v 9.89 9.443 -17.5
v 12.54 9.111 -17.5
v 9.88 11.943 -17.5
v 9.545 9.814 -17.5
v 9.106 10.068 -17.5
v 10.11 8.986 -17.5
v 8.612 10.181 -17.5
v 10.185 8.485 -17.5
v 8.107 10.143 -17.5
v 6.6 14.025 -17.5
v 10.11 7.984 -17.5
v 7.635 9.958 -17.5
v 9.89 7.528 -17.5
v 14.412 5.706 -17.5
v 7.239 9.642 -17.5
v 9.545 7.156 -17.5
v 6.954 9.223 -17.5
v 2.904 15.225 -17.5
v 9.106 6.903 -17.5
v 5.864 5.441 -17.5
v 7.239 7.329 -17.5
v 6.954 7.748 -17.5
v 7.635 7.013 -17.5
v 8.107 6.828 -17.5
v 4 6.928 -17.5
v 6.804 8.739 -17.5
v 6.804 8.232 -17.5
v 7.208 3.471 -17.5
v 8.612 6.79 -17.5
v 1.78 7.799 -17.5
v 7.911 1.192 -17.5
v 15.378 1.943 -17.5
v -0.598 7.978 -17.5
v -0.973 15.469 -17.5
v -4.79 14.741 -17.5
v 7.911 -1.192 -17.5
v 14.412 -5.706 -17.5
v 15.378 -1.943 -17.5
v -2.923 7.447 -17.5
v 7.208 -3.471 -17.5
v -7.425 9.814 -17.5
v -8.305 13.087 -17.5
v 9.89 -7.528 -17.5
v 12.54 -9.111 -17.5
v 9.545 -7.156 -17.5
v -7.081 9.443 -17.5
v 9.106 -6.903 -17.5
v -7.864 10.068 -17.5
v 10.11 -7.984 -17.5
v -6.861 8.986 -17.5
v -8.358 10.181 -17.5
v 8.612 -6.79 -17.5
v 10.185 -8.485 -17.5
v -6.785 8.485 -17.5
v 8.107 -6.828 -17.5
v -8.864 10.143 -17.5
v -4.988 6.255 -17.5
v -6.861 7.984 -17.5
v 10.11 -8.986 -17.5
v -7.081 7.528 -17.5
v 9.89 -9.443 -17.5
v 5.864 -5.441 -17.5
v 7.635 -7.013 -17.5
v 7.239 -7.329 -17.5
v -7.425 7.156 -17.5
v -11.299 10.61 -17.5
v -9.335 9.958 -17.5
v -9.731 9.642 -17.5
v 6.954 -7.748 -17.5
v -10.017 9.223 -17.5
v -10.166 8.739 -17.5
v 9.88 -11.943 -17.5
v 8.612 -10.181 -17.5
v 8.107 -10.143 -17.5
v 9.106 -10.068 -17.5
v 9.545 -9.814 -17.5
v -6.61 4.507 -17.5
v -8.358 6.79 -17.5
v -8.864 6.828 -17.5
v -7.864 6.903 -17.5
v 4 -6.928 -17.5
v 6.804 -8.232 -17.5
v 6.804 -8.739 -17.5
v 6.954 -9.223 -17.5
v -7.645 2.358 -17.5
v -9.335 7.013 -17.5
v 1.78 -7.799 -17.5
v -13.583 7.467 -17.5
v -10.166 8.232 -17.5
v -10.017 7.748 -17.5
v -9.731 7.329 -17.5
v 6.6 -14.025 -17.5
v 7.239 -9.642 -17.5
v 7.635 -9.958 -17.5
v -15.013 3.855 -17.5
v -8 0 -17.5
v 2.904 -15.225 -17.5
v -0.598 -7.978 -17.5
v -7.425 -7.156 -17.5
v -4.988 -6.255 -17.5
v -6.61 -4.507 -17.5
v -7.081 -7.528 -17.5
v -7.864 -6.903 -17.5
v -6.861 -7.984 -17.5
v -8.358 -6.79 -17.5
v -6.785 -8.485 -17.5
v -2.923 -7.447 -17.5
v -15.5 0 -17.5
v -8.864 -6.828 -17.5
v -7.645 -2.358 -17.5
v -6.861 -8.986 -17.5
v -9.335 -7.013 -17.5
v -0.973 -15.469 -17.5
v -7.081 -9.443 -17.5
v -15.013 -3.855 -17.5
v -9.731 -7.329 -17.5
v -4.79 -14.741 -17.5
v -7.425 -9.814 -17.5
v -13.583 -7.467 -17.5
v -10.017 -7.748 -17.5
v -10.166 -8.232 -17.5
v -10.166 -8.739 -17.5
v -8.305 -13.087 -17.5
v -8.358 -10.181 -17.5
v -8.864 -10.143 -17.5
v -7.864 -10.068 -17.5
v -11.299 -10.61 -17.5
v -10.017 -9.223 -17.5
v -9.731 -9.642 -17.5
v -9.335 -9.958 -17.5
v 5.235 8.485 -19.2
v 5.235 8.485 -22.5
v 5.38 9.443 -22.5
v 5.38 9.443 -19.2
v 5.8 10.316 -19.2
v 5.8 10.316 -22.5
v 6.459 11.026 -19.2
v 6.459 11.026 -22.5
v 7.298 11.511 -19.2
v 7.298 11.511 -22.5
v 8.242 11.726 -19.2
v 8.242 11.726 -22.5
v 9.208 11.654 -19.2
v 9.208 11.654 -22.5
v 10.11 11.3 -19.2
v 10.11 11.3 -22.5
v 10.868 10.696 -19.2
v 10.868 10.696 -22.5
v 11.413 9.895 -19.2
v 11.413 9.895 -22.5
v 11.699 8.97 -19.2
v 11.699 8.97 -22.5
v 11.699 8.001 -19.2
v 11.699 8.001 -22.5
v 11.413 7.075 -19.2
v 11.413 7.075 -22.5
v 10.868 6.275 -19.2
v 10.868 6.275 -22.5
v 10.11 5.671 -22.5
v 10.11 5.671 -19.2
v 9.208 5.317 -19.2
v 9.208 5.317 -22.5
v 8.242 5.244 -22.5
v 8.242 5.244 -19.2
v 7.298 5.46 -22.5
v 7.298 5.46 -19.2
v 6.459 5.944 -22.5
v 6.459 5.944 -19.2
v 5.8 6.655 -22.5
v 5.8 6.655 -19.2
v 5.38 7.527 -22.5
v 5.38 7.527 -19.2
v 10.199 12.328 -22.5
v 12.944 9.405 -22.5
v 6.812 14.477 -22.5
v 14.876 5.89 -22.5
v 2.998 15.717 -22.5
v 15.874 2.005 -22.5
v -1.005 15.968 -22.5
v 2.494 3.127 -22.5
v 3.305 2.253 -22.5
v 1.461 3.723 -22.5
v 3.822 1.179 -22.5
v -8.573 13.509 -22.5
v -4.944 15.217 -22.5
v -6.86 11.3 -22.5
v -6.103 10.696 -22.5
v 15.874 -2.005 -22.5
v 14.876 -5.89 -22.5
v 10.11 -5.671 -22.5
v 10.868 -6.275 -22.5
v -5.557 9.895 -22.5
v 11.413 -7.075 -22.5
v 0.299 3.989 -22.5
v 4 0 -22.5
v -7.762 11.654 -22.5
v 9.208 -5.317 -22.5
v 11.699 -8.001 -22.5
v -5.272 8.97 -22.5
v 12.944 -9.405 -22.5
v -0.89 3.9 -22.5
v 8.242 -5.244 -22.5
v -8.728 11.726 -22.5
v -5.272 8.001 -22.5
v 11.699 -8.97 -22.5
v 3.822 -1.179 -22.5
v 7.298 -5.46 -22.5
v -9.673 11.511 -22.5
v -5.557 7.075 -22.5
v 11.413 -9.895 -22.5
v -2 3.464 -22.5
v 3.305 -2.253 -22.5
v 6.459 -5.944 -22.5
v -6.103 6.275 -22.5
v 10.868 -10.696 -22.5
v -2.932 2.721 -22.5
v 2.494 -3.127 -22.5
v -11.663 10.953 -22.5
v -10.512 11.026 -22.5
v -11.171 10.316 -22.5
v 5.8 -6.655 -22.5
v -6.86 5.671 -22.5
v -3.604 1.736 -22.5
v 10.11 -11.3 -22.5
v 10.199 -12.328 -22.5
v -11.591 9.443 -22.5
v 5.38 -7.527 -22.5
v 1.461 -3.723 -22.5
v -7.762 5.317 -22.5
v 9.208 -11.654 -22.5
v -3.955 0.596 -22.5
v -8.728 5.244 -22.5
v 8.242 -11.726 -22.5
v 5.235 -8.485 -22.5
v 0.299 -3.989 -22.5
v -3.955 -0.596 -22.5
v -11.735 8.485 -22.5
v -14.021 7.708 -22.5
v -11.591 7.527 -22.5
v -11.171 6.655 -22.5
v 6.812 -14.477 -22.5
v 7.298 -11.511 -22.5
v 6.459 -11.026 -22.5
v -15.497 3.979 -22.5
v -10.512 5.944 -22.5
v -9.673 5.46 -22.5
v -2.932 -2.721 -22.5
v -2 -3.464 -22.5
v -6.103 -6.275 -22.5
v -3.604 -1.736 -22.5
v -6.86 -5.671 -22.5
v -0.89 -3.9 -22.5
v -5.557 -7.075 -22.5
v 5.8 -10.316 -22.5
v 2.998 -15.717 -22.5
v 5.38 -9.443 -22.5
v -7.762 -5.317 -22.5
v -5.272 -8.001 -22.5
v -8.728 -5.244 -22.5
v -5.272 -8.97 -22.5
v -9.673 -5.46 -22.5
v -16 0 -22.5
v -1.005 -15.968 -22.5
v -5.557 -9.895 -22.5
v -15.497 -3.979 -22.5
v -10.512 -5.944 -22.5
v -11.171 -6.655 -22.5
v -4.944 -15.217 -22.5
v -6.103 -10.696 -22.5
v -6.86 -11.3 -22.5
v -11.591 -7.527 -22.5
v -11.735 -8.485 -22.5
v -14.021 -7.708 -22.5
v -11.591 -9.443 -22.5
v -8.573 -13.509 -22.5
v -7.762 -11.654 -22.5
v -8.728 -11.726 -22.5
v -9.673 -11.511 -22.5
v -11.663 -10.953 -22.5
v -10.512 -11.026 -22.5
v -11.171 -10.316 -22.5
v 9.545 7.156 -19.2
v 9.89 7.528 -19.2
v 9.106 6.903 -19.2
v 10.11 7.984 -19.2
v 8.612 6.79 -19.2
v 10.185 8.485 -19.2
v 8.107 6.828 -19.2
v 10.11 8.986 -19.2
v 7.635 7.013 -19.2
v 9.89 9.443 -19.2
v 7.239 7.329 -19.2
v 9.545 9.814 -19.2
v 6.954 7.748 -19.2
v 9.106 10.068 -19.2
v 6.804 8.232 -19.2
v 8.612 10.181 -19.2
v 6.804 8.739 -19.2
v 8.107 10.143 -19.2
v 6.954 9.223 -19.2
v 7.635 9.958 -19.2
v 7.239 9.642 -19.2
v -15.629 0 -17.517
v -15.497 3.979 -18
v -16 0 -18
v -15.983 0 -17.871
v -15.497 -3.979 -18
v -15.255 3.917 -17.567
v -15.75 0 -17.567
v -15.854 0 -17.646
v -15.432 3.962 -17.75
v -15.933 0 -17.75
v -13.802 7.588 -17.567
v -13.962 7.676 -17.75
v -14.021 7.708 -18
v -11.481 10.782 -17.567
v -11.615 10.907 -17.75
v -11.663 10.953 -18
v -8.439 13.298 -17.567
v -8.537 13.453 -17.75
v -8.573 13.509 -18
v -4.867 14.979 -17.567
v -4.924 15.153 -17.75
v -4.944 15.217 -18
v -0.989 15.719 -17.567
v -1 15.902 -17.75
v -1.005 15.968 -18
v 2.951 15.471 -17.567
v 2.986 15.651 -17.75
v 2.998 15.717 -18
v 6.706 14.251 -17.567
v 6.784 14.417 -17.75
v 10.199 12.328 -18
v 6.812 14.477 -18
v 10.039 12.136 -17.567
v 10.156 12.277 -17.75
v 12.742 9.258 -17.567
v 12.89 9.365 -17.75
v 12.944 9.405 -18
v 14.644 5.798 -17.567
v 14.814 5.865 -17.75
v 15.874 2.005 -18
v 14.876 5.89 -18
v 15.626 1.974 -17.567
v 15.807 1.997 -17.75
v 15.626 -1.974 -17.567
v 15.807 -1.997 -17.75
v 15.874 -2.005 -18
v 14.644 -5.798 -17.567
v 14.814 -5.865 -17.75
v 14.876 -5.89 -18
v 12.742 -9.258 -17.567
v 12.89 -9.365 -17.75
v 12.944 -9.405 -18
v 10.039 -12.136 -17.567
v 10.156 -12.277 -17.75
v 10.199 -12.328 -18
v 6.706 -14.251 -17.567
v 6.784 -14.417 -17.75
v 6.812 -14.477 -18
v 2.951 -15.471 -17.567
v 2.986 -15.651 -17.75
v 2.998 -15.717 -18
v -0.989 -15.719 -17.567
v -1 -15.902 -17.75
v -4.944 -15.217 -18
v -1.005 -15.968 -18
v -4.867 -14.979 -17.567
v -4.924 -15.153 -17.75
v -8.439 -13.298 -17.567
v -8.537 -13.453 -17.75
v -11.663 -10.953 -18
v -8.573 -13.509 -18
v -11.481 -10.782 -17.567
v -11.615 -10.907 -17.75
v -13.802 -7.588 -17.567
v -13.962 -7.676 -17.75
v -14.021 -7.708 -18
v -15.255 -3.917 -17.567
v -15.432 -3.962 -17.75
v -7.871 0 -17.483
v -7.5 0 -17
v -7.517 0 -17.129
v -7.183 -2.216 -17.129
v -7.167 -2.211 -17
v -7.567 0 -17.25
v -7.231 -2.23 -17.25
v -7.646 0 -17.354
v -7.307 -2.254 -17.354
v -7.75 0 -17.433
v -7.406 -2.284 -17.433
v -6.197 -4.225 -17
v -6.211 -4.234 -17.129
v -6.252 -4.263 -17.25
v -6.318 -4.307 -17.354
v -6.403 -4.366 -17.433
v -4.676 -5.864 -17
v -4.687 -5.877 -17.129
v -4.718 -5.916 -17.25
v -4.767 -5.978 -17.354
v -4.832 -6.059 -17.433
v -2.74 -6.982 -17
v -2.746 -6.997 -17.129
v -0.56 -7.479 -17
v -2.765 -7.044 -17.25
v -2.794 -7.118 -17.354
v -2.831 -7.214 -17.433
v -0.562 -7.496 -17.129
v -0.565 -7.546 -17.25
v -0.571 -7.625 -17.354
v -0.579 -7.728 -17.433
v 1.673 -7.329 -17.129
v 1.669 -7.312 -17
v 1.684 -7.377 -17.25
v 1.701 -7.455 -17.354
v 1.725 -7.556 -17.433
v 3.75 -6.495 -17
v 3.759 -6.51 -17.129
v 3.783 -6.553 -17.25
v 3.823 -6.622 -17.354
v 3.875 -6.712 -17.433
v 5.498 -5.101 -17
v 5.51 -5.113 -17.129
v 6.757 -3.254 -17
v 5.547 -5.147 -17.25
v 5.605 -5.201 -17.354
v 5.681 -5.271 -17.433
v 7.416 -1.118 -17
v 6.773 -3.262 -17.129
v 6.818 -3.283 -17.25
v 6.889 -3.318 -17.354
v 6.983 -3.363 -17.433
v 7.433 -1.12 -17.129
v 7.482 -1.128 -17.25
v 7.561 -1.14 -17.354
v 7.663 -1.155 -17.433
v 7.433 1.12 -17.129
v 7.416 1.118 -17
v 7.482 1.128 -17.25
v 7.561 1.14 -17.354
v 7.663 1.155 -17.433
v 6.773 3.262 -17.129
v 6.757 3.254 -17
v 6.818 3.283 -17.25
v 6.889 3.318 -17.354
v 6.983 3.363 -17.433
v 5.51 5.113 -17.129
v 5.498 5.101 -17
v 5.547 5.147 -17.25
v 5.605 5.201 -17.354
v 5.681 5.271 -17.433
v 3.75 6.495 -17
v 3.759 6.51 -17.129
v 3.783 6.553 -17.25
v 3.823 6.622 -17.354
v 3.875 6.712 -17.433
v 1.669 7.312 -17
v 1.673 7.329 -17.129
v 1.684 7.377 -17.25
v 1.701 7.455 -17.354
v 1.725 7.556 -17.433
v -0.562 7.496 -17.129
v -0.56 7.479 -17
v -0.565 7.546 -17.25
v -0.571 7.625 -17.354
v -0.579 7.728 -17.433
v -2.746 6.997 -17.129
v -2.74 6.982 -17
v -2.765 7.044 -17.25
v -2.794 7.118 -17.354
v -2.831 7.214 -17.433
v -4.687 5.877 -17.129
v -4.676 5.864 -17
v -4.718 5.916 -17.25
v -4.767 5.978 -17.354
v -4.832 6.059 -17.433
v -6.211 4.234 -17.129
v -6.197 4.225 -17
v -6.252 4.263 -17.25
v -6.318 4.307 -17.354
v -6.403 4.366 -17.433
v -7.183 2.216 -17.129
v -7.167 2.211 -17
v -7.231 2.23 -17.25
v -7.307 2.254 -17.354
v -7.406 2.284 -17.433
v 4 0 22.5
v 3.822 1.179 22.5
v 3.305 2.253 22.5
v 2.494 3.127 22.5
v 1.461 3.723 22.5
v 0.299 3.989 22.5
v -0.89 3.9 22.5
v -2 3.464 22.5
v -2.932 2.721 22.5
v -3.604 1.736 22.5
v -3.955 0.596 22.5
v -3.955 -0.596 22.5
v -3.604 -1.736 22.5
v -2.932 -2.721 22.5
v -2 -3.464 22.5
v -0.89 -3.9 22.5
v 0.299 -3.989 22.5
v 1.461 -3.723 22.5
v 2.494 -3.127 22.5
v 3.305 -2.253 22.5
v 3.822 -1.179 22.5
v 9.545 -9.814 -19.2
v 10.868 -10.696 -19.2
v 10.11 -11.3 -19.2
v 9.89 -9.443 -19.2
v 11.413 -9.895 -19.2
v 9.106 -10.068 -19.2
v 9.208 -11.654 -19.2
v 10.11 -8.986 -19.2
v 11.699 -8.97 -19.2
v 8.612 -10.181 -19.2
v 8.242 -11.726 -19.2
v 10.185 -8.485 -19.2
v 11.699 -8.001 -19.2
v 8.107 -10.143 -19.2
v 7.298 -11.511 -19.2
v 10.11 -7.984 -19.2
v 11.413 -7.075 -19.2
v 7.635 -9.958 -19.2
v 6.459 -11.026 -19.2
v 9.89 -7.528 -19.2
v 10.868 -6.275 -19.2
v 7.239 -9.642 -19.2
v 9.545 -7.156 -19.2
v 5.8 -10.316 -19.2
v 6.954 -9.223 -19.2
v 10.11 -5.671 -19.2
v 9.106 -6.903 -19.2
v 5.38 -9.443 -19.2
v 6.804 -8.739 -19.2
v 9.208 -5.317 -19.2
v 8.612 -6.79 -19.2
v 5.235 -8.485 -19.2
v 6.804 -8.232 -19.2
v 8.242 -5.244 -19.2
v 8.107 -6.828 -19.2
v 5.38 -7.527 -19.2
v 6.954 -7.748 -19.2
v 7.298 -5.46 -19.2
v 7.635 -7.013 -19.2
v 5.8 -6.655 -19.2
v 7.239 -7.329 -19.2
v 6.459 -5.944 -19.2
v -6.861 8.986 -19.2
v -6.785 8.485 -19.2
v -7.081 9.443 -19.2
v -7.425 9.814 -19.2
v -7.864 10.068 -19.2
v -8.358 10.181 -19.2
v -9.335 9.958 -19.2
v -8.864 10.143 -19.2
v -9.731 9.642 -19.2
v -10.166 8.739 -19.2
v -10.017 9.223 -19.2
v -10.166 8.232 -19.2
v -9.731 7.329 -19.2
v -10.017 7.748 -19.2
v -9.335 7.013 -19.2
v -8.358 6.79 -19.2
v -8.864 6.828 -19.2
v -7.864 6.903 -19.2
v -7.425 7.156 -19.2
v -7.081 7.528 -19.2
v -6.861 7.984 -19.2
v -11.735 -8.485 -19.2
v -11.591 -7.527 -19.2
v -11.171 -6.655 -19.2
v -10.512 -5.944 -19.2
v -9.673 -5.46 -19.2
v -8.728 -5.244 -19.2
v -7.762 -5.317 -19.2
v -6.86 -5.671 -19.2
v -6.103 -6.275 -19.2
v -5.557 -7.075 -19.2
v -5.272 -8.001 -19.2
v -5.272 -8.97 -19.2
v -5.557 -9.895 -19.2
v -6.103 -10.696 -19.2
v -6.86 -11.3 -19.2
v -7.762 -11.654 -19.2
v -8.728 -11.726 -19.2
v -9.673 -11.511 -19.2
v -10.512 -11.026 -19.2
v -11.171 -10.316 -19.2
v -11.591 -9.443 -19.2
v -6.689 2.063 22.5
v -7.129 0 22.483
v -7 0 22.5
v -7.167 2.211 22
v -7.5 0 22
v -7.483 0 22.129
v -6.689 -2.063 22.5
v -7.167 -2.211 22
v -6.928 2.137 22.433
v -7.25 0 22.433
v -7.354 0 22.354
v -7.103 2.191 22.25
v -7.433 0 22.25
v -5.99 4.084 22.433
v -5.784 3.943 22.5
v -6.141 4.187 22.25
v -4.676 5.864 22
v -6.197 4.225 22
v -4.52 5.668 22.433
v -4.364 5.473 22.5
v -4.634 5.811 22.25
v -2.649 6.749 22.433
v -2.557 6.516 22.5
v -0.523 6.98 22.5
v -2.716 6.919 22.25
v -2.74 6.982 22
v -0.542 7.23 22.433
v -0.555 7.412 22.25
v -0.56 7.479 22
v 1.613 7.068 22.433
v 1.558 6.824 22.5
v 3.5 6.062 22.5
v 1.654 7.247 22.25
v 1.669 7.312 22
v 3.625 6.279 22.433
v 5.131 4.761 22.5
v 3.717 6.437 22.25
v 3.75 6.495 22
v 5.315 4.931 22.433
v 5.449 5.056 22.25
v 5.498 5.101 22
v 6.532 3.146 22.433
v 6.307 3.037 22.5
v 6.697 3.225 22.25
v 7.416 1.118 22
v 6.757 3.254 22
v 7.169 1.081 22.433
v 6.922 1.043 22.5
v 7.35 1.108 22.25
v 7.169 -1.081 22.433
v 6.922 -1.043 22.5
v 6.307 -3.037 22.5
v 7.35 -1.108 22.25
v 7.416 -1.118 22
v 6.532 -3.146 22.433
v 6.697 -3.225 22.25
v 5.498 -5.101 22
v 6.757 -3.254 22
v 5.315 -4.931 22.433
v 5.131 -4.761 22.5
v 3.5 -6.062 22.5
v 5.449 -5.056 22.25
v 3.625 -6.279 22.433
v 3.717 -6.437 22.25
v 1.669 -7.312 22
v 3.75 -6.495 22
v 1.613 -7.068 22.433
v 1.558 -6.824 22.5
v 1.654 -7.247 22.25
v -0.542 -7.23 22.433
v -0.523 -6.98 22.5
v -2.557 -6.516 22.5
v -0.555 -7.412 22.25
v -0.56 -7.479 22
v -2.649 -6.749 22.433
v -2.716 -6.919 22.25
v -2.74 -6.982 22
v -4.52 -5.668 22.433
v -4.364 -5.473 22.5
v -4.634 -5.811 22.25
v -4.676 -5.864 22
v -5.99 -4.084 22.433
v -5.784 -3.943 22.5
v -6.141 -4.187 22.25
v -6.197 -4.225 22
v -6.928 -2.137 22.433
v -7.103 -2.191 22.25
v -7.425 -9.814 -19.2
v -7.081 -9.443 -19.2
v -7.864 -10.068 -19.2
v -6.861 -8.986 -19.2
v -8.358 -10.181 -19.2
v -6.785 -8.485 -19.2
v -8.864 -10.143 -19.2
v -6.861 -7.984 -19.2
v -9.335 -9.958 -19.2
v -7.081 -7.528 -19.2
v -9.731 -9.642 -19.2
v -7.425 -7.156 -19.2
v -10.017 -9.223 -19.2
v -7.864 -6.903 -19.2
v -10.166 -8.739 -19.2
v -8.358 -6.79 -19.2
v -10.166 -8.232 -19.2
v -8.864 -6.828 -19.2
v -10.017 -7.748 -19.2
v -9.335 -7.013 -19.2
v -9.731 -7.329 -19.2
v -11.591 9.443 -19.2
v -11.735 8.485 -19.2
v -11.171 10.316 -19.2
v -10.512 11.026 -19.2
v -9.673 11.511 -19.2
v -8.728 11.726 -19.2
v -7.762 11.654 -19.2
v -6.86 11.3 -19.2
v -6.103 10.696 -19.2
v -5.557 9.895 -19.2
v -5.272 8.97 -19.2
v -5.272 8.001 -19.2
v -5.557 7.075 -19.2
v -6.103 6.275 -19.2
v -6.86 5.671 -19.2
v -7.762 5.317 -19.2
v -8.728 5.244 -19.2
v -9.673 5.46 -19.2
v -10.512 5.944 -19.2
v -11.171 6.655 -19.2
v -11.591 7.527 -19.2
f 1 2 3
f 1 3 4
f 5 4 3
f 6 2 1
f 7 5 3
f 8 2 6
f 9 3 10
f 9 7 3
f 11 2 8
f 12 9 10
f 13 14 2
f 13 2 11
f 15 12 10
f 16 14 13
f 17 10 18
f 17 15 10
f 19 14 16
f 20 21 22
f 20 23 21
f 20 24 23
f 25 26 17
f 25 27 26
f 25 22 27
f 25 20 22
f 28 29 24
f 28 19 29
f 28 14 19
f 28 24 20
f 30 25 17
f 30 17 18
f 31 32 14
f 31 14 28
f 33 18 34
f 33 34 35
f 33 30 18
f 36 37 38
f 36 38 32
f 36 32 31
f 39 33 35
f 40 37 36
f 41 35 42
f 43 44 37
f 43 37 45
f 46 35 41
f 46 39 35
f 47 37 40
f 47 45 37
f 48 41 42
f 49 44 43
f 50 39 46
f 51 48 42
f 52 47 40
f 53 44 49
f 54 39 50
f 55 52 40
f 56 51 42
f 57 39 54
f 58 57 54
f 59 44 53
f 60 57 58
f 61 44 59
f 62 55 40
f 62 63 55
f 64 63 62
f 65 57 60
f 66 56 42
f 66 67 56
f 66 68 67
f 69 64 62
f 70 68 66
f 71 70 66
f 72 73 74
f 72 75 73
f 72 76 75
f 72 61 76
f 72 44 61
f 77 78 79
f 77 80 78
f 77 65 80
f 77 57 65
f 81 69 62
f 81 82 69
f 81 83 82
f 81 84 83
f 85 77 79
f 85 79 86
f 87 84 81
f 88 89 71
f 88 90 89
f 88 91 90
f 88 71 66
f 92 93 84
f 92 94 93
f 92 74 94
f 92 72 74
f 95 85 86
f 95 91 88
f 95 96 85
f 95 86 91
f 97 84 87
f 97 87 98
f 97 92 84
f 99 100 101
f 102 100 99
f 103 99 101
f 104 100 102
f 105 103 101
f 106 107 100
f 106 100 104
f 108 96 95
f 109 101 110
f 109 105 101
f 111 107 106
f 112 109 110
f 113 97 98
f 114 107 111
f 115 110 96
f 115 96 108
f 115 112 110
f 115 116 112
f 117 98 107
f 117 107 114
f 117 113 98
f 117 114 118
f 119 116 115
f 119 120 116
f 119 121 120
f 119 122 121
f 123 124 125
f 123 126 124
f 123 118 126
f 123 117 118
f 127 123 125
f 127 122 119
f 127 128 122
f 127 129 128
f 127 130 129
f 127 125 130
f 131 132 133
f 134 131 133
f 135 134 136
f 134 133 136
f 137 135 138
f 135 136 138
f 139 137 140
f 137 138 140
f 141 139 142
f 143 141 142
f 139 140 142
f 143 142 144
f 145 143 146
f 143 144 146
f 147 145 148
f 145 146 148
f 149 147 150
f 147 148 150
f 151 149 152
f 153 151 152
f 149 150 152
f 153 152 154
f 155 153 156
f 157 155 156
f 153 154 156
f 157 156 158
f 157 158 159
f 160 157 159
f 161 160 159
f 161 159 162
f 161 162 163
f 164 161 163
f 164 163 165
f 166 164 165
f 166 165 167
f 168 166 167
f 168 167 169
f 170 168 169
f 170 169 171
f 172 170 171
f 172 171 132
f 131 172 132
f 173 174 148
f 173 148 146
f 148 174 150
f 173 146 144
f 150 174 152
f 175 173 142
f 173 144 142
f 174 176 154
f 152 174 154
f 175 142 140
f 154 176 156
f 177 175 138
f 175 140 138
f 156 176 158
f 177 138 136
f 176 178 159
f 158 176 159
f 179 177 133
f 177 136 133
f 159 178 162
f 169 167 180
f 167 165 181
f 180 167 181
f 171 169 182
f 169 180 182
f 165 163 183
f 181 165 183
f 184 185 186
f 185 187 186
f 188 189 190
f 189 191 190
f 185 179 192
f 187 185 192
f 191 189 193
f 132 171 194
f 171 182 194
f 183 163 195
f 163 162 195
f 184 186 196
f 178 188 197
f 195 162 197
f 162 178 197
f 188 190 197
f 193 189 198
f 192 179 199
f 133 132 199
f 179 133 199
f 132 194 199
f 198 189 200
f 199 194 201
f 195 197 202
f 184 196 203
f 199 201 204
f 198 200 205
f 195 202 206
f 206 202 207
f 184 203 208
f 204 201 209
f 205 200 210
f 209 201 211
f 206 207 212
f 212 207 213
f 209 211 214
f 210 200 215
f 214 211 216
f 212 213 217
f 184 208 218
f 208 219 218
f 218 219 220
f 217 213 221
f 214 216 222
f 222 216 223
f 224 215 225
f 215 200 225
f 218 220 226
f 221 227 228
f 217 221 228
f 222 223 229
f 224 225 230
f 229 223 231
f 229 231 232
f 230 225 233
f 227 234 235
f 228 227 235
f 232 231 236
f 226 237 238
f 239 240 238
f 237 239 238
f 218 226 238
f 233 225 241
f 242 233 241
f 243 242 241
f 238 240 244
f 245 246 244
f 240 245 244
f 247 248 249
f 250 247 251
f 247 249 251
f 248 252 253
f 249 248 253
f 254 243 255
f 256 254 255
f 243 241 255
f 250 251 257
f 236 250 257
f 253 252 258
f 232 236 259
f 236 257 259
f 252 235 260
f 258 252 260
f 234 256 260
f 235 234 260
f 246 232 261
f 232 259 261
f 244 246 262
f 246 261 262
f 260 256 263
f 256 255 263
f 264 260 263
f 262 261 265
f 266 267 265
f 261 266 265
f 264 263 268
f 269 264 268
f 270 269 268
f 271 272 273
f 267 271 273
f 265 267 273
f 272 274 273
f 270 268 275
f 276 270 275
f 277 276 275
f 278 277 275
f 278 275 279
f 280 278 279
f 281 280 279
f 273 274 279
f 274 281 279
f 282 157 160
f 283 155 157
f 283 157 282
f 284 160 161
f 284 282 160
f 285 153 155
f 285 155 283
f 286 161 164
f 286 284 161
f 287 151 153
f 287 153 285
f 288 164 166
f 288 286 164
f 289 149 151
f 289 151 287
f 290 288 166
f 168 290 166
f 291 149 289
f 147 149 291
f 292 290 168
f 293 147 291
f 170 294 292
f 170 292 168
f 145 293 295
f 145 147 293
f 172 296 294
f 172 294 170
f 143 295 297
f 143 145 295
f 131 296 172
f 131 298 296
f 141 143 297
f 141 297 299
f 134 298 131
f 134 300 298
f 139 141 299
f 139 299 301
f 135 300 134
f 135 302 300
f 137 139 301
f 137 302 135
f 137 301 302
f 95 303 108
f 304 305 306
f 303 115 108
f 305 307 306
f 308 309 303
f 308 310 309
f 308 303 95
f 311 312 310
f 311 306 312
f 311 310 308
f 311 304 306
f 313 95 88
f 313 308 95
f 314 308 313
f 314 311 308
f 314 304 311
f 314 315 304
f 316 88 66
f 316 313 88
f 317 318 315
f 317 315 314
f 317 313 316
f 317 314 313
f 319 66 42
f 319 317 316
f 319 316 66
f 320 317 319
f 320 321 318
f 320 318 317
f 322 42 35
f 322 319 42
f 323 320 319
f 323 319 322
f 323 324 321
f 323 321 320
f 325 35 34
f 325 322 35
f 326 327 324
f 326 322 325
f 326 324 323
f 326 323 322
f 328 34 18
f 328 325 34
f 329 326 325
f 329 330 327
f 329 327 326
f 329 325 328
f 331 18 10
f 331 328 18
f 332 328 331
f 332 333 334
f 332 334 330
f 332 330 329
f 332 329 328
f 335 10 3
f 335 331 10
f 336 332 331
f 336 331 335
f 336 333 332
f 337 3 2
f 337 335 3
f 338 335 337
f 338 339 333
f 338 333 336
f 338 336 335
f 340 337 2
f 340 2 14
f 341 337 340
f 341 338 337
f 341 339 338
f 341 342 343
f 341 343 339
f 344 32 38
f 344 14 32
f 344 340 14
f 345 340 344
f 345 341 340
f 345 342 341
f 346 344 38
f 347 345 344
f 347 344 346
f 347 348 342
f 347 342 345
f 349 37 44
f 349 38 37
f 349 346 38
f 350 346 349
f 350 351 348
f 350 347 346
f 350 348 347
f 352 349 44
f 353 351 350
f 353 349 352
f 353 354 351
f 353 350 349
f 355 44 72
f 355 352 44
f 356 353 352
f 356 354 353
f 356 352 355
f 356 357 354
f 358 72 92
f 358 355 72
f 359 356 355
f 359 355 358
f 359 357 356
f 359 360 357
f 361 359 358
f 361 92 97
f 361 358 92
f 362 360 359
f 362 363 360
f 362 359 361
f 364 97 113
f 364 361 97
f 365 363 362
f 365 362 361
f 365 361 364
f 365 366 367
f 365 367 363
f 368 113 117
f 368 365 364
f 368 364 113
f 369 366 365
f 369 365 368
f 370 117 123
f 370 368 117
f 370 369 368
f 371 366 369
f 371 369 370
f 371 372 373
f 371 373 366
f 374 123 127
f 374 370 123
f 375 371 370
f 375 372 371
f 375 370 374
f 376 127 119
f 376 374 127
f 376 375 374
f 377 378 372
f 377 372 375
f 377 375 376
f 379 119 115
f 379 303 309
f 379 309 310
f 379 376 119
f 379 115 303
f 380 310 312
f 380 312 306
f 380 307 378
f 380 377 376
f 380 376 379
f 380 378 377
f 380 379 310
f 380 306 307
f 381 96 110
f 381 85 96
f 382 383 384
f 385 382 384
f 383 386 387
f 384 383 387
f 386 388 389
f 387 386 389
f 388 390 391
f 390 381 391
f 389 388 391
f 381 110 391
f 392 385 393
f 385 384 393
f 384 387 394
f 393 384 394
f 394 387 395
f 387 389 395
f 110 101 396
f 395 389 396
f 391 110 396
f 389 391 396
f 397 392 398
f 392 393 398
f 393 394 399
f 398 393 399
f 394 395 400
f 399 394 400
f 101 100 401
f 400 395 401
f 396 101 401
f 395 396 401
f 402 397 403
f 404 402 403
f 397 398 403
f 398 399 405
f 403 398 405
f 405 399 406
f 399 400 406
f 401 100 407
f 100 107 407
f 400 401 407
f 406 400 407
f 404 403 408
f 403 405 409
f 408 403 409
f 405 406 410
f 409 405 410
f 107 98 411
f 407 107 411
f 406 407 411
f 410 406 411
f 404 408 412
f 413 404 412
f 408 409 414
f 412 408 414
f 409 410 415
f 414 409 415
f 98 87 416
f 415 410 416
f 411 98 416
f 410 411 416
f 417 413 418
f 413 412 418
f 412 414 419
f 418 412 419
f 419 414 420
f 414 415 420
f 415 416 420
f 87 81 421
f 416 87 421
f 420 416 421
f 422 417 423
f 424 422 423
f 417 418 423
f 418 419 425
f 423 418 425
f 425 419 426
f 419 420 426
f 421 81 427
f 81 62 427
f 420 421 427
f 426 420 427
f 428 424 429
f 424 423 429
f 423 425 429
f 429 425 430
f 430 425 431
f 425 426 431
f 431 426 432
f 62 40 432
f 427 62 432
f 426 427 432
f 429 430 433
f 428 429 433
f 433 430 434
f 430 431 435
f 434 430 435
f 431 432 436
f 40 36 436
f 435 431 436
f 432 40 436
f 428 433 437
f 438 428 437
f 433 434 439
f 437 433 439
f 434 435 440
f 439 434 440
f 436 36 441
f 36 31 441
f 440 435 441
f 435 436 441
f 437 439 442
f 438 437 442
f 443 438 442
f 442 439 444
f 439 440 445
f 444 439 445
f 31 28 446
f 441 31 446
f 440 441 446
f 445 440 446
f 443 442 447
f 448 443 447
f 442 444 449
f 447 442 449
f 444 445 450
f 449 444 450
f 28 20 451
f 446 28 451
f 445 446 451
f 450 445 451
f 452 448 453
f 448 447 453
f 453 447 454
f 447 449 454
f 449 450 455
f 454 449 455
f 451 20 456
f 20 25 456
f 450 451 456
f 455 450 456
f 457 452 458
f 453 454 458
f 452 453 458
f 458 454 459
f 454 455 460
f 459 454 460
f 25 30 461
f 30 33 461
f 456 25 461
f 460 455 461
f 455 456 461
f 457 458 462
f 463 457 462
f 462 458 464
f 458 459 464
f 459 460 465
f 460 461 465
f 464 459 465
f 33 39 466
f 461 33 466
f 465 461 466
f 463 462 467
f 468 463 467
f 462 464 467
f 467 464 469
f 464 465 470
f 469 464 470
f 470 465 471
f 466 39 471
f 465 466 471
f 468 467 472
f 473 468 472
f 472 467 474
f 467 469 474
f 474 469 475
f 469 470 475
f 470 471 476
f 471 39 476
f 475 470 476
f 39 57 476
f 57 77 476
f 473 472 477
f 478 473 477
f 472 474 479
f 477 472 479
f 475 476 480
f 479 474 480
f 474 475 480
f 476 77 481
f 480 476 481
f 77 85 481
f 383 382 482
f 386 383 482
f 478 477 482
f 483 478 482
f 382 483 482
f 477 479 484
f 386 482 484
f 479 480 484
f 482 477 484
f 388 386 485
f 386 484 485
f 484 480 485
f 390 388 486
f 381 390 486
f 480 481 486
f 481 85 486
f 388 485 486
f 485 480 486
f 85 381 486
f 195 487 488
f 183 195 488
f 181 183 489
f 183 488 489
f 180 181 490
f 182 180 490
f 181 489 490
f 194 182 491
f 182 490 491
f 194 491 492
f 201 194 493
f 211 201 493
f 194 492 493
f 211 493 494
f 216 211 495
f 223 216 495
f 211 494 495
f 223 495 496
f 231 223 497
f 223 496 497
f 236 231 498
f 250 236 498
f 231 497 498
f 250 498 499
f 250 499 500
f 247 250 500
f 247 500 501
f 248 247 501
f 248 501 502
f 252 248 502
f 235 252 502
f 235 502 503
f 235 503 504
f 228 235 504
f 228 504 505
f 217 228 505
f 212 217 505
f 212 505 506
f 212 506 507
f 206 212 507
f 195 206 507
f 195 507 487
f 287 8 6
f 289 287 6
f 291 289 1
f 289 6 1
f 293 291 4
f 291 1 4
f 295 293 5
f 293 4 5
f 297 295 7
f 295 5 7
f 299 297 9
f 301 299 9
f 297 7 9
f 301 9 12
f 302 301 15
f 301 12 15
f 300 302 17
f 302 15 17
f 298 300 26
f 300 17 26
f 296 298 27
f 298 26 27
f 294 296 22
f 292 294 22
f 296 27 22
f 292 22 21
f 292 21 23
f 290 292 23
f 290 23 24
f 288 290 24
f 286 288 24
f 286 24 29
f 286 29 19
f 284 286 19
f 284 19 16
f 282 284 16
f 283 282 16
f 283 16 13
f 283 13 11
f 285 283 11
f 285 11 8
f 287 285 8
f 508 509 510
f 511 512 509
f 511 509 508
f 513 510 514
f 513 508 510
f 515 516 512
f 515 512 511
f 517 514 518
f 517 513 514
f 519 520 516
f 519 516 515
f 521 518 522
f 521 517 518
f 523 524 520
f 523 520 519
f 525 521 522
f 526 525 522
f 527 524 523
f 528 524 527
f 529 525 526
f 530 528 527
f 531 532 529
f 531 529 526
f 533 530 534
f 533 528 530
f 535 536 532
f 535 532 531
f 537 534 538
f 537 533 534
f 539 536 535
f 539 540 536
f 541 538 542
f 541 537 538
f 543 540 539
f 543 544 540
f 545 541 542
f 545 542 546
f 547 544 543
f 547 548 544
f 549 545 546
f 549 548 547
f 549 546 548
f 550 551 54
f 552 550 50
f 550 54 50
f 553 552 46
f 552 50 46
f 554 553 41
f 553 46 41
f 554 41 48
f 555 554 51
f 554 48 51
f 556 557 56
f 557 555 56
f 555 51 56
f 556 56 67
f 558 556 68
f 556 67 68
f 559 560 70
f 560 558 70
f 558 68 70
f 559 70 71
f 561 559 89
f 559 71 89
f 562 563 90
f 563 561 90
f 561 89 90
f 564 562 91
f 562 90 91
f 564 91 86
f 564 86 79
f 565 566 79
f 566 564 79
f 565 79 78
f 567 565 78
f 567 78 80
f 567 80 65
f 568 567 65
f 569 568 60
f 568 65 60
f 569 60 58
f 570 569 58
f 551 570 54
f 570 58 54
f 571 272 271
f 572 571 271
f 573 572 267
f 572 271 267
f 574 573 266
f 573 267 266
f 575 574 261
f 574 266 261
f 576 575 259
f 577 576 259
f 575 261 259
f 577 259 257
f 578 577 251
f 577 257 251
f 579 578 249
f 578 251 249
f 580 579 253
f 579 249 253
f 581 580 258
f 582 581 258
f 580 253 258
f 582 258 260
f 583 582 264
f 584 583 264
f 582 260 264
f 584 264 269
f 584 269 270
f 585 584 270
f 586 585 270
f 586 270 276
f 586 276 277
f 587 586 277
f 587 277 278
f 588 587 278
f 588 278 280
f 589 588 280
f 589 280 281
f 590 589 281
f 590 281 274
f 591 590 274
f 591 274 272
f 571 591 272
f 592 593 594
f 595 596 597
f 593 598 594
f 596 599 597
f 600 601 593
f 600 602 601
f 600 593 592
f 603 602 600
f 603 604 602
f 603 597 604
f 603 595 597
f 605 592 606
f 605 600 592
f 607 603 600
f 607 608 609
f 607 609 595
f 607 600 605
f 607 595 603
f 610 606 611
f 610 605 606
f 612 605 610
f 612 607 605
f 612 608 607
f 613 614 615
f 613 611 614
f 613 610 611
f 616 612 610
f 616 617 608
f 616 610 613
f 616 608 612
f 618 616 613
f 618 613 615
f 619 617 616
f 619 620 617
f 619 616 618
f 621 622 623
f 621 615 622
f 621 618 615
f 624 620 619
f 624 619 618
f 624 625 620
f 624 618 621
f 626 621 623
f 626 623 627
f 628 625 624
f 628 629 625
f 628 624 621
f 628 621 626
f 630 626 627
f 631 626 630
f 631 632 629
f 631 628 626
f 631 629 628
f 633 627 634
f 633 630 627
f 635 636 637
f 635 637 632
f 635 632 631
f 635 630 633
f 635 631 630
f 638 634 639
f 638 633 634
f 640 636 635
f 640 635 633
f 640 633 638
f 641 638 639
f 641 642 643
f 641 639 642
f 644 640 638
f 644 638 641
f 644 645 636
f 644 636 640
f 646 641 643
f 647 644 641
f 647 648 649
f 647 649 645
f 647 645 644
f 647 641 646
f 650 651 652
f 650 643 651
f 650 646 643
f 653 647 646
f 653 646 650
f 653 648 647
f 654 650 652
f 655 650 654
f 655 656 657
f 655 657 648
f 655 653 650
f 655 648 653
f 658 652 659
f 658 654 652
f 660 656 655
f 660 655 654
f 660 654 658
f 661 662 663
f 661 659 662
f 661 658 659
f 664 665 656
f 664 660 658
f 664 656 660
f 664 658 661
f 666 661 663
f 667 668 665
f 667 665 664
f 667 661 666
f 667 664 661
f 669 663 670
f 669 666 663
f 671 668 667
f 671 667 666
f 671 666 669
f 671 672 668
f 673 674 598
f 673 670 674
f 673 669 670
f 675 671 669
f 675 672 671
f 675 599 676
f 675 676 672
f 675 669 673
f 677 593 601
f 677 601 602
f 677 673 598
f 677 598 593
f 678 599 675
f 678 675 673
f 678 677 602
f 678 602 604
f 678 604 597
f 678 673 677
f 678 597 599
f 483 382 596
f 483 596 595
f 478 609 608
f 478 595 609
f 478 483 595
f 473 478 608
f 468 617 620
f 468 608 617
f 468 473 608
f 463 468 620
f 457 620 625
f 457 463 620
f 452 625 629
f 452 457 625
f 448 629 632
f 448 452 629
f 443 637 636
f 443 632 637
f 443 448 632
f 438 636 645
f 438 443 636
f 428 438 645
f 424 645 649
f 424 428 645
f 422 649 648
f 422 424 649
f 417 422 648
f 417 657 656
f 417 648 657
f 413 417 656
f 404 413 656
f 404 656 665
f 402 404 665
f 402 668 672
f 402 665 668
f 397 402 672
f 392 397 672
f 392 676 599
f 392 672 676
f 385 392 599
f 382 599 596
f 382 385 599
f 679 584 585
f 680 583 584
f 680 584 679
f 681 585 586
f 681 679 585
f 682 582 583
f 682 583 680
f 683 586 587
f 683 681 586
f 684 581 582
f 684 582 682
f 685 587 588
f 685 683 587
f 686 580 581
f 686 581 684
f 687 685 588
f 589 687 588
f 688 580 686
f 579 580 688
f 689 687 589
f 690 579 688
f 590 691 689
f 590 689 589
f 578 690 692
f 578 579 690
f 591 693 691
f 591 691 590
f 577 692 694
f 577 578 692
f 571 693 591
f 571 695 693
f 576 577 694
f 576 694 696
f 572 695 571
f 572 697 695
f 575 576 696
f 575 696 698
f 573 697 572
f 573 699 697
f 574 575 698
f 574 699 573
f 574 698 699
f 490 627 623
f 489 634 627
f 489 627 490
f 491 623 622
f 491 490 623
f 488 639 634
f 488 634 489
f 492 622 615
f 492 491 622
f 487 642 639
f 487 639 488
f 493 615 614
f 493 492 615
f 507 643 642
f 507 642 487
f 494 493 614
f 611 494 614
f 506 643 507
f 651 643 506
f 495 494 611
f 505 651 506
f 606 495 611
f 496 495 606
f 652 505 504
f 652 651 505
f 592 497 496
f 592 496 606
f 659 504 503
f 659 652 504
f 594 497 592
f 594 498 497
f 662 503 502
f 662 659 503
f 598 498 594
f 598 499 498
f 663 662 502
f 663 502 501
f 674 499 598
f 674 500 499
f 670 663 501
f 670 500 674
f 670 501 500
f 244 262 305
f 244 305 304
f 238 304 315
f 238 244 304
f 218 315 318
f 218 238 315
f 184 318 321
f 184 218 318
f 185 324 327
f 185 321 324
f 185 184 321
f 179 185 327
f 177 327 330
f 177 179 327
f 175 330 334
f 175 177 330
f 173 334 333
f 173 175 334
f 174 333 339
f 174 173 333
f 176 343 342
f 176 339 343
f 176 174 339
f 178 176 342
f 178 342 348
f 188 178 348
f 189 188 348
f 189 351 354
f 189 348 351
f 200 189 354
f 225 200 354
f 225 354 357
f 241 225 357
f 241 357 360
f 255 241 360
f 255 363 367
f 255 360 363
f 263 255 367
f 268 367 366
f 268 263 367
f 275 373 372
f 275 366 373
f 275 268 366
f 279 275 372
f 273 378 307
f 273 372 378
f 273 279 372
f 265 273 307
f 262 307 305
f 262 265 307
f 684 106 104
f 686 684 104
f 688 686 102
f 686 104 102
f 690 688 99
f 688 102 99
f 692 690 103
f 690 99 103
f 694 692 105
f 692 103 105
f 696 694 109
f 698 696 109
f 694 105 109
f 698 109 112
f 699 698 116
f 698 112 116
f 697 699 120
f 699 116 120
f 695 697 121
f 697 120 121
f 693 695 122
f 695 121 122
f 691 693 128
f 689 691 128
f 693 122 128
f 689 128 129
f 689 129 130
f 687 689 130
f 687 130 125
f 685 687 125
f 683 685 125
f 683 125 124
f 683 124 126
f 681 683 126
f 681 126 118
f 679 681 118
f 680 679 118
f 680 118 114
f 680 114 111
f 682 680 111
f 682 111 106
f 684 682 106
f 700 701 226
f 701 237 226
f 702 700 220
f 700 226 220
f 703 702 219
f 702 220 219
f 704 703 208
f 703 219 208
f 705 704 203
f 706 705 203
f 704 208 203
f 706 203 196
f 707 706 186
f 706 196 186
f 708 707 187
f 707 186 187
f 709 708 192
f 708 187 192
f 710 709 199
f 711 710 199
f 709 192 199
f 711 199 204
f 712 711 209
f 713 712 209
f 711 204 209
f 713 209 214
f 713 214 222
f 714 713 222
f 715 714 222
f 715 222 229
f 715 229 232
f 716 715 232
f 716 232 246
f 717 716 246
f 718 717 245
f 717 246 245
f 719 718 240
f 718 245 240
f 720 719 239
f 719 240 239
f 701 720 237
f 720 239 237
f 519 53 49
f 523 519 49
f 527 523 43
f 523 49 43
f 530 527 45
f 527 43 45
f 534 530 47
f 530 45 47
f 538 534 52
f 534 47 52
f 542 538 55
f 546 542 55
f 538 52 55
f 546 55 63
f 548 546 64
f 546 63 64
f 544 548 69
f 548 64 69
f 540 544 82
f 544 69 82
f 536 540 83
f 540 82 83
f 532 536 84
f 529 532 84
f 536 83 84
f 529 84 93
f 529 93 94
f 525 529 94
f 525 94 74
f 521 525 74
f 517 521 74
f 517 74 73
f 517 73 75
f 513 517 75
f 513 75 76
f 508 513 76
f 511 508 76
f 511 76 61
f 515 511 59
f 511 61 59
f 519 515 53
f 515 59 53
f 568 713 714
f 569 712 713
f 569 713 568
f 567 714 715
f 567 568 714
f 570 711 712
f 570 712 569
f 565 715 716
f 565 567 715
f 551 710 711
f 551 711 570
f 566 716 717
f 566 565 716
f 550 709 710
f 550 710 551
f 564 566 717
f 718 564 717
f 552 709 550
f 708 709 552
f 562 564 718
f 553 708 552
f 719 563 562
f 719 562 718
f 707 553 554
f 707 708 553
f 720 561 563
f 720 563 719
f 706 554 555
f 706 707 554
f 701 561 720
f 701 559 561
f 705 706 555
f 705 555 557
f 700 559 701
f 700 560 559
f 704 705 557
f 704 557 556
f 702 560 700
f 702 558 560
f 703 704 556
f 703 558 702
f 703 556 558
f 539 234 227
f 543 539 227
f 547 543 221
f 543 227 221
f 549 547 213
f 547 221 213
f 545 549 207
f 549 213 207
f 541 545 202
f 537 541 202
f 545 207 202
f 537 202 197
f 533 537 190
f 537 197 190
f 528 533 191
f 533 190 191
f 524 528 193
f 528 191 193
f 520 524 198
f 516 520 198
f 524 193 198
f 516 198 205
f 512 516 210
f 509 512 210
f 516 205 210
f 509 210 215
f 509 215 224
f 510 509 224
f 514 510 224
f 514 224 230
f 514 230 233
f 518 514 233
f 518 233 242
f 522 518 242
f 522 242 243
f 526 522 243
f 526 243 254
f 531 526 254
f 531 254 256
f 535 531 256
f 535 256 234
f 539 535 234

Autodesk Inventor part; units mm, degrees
ref_plane "YZ Plane" through (0, 0, 0) normal (1, 0, 0) x (0, 1, 0)
ref_plane "XZ Plane" through (0, 0, 0) normal (0, 1, 0) x (-1, 0, 0)
ref_plane "XY Plane" through (0, 0, 0) normal (0, 0, 1) x (1, 0, 0)
sketch "Sketch1" plane through (0, 0, 0) normal (0, 1, 0) x (-1, 0, 0)
  line L0 (0, 22.5) -> (7.5, 22.5)
  line L1 (7.5, 22.5) -> (7.5, -17.5)
  line L2 (7.5, -17.5) -> (16, -17.5)
  line L3 (16, -17.5) -> (16, -22.5)
  line L4 (16, -22.5) -> (0, -22.5)
  line L5 (0, -22.5) -> (0, 22.5)
  point P0 (0, 0)
  point P1 (0, 0)
  dimension "d0" = 7.5
  dimension "d1" = 5
  dimension "d3" = 16
  dimension "d4" = 45
revolve "Revolution1" add sketch "Sketch1" angle 360 about axis through (0, 0, -22.5) along (0, 0, 1)
sketch "Sketch2" plane through (0, 0, 22.5) normal (0, 0, 1) x (1, 0, 0)
  circle A0 centre (0, 0) radius 4
  dimension "d5" = 8
extrude "Extrusion1" cut sketch "Sketch2" against normal up to next
sketch "Sketch3" plane through (0, 0, -17.5) normal (0, 0, 1) x (1, 0, 0)
  circle A0 centre (-8.4853, 8.4853) radius 1.7
  line L0 (0, 0) -> (-8.4853, 8.4853) construction
  line L1 (0, 0) -> (-3.1591, 0)
  circle A1 centre (-8.4853, -8.4853) radius 1.7
  circle A2 centre (8.4853, -8.4853) radius 1.7
  circle A3 centre (8.4853, 8.4853) radius 1.7
  dimension "d8" = 3.4
  dimension "d9" = 12
  dimension "d10" = 45
  dimension "d13" = 360
extrude "Extrusion2" cut sketch "Sketch3" against normal up to next
sketch "Sketch4" plane through (0, 0, -22.5) normal (0, 0, -1) x (-1, 0, 0)
  circle A0 centre (8.4853, 8.4853) radius 1.7 projected
  circle A1 centre (8.4853, 8.4853) radius 3.25
  circle A2 centre (-8.4853, 8.4853) radius 3.25
  circle A3 centre (-8.4853, -8.4853) radius 3.25
  circle A4 centre (8.4853, -8.4853) radius 3.25
  point P0 (0, 0)
  dimension "d17" = 6.5
  dimension "d20" = 360
extrude "Extrusion3" cut sketch "Sketch4" against normal blind 3.3
fillet "Fillet1" radius 0.5 3 edges at (7.5, 0, -17.5) (16, 0, -17.5) (7.5, 0, 22.5)
properties part number "LMF8LUU"
